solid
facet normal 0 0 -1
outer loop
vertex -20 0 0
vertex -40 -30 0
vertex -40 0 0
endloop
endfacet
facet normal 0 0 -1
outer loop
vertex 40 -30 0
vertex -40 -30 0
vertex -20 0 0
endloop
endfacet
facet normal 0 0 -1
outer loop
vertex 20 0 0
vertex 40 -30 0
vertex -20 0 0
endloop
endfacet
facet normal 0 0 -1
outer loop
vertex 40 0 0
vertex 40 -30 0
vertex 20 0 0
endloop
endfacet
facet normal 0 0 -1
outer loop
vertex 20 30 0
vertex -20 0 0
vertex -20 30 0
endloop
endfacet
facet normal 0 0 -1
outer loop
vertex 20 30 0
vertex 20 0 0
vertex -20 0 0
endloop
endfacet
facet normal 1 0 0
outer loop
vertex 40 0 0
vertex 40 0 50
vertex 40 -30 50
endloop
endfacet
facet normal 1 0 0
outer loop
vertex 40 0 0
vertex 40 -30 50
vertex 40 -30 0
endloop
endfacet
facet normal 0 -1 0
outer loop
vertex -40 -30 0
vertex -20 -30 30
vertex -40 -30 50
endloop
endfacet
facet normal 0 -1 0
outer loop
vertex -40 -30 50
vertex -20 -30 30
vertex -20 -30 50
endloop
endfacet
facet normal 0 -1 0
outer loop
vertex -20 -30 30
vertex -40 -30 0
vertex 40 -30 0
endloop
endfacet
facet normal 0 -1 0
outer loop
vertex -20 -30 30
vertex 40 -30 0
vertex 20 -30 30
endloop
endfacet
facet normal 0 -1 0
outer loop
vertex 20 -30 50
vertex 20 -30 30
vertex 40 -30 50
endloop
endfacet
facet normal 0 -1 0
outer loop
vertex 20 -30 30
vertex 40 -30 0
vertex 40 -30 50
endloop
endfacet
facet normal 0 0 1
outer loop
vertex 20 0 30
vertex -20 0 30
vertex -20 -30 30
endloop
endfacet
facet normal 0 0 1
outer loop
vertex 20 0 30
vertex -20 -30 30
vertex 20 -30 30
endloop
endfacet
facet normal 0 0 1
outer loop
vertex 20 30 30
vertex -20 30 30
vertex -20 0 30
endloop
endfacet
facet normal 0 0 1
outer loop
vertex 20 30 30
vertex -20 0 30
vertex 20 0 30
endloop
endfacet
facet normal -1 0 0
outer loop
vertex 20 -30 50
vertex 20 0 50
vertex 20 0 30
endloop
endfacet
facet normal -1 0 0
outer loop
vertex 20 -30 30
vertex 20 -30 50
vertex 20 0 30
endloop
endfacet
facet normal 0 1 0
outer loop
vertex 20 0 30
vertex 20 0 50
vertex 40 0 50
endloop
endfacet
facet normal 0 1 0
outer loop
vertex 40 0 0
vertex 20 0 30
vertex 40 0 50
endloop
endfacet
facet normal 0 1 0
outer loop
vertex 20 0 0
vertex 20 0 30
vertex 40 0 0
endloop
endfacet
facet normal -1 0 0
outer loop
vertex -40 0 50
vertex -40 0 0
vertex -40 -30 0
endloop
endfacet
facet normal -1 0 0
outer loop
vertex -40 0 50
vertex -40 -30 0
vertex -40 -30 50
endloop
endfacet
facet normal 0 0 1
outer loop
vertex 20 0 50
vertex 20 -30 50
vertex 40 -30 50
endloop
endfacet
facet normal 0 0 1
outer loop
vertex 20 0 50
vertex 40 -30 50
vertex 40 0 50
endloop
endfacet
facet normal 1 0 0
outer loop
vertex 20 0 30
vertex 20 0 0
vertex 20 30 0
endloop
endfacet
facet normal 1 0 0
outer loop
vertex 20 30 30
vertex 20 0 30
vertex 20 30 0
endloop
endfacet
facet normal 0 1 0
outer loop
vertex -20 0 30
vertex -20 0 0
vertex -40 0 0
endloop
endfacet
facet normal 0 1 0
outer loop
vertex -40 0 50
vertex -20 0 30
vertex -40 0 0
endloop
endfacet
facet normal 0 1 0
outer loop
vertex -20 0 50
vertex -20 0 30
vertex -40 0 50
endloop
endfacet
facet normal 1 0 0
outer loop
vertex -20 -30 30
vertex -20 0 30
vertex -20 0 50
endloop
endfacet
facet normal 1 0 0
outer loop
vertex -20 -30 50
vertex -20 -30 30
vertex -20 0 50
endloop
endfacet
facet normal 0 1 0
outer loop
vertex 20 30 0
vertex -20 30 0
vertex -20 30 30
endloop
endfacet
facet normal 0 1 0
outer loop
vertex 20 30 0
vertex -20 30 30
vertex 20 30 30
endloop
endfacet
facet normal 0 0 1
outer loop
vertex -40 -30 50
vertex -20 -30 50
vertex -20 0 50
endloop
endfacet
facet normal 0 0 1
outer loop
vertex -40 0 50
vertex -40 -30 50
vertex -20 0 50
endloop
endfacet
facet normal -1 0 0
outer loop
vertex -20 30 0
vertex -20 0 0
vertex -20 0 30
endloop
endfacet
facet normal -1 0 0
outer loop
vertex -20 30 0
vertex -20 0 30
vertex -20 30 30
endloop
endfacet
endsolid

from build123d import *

# Parameters (mm, degrees)
CROQUIS2_W              = 40
CROQUIS2_H              = 60
SALIENTE_EXTRUIR1_DEPTH = 30
CROQUIS3_W              = 50
CROQUIS3_H              = 30
SALIENTE_EXTRUIR2_DEPTH = 20
CROQUIS4_W              = 50
CROQUIS4_H              = 30
SALIENTE_EXTRUIR3_DEPTH = 20


with BuildPart() as part:
    # Croquis2 → Saliente-Extruir1 (new body)
    with BuildSketch(Plane.XY):
        Rectangle(CROQUIS2_W, CROQUIS2_H)
    extrude(amount=SALIENTE_EXTRUIR1_DEPTH)

    # Croquis3 → Saliente-Extruir2 (add)
    with BuildSketch(Plane(origin=(20, 0, 0), x_dir=(0, 0, -1), z_dir=(1, 0, 0))):
        with Locations((-25, -15)):
            Rectangle(CROQUIS3_W, CROQUIS3_H)
    extrude(amount=SALIENTE_EXTRUIR2_DEPTH)

    # Croquis4 → Saliente-Extruir3 (add)
    with BuildSketch(Plane.ZY.offset(20)):
        with Locations((25, -15)):
            Rectangle(CROQUIS4_W, CROQUIS4_H)
    extrude(amount=SALIENTE_EXTRUIR3_DEPTH)


solid = part.part
